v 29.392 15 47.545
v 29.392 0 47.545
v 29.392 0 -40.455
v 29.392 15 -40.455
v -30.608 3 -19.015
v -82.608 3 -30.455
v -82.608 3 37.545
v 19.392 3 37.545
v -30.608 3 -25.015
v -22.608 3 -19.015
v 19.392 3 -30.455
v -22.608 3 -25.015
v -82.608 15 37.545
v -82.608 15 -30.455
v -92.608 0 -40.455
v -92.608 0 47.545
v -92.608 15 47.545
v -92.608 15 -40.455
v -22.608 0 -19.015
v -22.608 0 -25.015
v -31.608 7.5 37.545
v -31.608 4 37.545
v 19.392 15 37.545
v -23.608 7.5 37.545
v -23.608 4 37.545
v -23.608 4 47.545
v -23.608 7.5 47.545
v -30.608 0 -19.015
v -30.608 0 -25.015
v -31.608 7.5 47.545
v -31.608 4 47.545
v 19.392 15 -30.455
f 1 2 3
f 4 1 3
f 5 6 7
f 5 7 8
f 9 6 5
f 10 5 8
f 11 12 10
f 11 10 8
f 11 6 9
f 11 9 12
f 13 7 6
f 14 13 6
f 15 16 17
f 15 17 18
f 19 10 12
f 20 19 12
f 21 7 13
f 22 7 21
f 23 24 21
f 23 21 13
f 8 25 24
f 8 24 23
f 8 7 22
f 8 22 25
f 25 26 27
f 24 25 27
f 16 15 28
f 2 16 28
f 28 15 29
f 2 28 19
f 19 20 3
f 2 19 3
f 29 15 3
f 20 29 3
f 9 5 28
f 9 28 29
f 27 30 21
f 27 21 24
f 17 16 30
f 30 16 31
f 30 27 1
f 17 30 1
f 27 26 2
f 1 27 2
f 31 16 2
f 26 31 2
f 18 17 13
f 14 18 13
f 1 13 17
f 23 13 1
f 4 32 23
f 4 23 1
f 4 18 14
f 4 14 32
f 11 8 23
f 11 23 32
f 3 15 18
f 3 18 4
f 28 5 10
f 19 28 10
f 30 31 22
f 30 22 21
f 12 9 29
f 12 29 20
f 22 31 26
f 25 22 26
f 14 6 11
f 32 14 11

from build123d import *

# Parameters (mm, degrees)
SKETCH2_W                      = 122
SKETCH2_H                      = 88
SKETCH2_W_2                    = 102
SKETCH2_H_2                    = 68
BOSS_EXTRUDE4_DEPTH            = 15
SKETCH3_W                      = 102
SKETCH3_H                      = 68
BOSS_EXTRUDE5_DEPTH            = 3
CUT_EXTRUDE1_REACH             = 90
SKETCH4_W                      = 8
SKETCH4_H                      = 3.5
CUT_EXTRUDE1_DIRECTION_2_DEPTH = 1
SKETCH5_W                      = 8
SKETCH5_H                      = 6
CUT_EXTRUDE2_DEPTH             = 4


with BuildPart() as part:
    # Sketch2 → Boss-Extrude4 (new body)
    with BuildSketch(Plane(origin=(0, 0, 0), x_dir=(1, 0, 0), z_dir=(0, 1, 0))):
        with Locations((-31.608287026, -3.544696319)):
            Rectangle(SKETCH2_W, SKETCH2_H)
        with Locations((-31.608287026, -3.544696319)):
            Rectangle(SKETCH2_W_2, SKETCH2_H_2, mode=Mode.SUBTRACT)
    extrude(amount=BOSS_EXTRUDE4_DEPTH)

    # Sketch3 → Boss-Extrude5 (add)
    with BuildSketch(Plane(origin=(0, 0, 0), x_dir=(1, 0, 0), z_dir=(0, 1, 0))):
        with Locations((-31.608287026, -3.544696319)):
            Rectangle(SKETCH3_W, SKETCH3_H)
    extrude(amount=BOSS_EXTRUDE5_DEPTH)

    # Sketch4 → Cut-Extrude1 (cut, up to next)
    with BuildSketch(Plane.XY.offset(47.544696319), mode=Mode.PRIVATE) as cut_extrude1_sk1:
        with Locations((-27.608287026, 5.75)):
            Rectangle(SKETCH4_W, SKETCH4_H)
    cut_extrude1_tool1 = extrude(cut_extrude1_sk1.sketch, amount=-CUT_EXTRUDE1_REACH, mode=Mode.PRIVATE) & part.part
    add(cut_extrude1_tool1.solids().sort_by_distance((-27.608287, 5.75, 47.544696))[0], mode=Mode.SUBTRACT)

    # Sketch4 → Cut-Extrude1 direction 2 (cut)
    with BuildSketch(Plane.XY.offset(47.544696319)):
        with Locations((-27.608287026, 5.75)):
            Rectangle(SKETCH4_W, SKETCH4_H)
    extrude(amount=CUT_EXTRUDE1_DIRECTION_2_DEPTH, mode=Mode.SUBTRACT)

    # Sketch5 → Cut-Extrude2 (cut, through all)
    with BuildSketch(Plane(origin=(0, 3, 0), x_dir=(1, 0, 0), z_dir=(0, 1, 0))):
        with Locations((-26.608287026, 22.015303681)):
            Rectangle(SKETCH5_W, SKETCH5_H)
    extrude(amount=-CUT_EXTRUDE2_DEPTH, mode=Mode.SUBTRACT)


solid = part.part
